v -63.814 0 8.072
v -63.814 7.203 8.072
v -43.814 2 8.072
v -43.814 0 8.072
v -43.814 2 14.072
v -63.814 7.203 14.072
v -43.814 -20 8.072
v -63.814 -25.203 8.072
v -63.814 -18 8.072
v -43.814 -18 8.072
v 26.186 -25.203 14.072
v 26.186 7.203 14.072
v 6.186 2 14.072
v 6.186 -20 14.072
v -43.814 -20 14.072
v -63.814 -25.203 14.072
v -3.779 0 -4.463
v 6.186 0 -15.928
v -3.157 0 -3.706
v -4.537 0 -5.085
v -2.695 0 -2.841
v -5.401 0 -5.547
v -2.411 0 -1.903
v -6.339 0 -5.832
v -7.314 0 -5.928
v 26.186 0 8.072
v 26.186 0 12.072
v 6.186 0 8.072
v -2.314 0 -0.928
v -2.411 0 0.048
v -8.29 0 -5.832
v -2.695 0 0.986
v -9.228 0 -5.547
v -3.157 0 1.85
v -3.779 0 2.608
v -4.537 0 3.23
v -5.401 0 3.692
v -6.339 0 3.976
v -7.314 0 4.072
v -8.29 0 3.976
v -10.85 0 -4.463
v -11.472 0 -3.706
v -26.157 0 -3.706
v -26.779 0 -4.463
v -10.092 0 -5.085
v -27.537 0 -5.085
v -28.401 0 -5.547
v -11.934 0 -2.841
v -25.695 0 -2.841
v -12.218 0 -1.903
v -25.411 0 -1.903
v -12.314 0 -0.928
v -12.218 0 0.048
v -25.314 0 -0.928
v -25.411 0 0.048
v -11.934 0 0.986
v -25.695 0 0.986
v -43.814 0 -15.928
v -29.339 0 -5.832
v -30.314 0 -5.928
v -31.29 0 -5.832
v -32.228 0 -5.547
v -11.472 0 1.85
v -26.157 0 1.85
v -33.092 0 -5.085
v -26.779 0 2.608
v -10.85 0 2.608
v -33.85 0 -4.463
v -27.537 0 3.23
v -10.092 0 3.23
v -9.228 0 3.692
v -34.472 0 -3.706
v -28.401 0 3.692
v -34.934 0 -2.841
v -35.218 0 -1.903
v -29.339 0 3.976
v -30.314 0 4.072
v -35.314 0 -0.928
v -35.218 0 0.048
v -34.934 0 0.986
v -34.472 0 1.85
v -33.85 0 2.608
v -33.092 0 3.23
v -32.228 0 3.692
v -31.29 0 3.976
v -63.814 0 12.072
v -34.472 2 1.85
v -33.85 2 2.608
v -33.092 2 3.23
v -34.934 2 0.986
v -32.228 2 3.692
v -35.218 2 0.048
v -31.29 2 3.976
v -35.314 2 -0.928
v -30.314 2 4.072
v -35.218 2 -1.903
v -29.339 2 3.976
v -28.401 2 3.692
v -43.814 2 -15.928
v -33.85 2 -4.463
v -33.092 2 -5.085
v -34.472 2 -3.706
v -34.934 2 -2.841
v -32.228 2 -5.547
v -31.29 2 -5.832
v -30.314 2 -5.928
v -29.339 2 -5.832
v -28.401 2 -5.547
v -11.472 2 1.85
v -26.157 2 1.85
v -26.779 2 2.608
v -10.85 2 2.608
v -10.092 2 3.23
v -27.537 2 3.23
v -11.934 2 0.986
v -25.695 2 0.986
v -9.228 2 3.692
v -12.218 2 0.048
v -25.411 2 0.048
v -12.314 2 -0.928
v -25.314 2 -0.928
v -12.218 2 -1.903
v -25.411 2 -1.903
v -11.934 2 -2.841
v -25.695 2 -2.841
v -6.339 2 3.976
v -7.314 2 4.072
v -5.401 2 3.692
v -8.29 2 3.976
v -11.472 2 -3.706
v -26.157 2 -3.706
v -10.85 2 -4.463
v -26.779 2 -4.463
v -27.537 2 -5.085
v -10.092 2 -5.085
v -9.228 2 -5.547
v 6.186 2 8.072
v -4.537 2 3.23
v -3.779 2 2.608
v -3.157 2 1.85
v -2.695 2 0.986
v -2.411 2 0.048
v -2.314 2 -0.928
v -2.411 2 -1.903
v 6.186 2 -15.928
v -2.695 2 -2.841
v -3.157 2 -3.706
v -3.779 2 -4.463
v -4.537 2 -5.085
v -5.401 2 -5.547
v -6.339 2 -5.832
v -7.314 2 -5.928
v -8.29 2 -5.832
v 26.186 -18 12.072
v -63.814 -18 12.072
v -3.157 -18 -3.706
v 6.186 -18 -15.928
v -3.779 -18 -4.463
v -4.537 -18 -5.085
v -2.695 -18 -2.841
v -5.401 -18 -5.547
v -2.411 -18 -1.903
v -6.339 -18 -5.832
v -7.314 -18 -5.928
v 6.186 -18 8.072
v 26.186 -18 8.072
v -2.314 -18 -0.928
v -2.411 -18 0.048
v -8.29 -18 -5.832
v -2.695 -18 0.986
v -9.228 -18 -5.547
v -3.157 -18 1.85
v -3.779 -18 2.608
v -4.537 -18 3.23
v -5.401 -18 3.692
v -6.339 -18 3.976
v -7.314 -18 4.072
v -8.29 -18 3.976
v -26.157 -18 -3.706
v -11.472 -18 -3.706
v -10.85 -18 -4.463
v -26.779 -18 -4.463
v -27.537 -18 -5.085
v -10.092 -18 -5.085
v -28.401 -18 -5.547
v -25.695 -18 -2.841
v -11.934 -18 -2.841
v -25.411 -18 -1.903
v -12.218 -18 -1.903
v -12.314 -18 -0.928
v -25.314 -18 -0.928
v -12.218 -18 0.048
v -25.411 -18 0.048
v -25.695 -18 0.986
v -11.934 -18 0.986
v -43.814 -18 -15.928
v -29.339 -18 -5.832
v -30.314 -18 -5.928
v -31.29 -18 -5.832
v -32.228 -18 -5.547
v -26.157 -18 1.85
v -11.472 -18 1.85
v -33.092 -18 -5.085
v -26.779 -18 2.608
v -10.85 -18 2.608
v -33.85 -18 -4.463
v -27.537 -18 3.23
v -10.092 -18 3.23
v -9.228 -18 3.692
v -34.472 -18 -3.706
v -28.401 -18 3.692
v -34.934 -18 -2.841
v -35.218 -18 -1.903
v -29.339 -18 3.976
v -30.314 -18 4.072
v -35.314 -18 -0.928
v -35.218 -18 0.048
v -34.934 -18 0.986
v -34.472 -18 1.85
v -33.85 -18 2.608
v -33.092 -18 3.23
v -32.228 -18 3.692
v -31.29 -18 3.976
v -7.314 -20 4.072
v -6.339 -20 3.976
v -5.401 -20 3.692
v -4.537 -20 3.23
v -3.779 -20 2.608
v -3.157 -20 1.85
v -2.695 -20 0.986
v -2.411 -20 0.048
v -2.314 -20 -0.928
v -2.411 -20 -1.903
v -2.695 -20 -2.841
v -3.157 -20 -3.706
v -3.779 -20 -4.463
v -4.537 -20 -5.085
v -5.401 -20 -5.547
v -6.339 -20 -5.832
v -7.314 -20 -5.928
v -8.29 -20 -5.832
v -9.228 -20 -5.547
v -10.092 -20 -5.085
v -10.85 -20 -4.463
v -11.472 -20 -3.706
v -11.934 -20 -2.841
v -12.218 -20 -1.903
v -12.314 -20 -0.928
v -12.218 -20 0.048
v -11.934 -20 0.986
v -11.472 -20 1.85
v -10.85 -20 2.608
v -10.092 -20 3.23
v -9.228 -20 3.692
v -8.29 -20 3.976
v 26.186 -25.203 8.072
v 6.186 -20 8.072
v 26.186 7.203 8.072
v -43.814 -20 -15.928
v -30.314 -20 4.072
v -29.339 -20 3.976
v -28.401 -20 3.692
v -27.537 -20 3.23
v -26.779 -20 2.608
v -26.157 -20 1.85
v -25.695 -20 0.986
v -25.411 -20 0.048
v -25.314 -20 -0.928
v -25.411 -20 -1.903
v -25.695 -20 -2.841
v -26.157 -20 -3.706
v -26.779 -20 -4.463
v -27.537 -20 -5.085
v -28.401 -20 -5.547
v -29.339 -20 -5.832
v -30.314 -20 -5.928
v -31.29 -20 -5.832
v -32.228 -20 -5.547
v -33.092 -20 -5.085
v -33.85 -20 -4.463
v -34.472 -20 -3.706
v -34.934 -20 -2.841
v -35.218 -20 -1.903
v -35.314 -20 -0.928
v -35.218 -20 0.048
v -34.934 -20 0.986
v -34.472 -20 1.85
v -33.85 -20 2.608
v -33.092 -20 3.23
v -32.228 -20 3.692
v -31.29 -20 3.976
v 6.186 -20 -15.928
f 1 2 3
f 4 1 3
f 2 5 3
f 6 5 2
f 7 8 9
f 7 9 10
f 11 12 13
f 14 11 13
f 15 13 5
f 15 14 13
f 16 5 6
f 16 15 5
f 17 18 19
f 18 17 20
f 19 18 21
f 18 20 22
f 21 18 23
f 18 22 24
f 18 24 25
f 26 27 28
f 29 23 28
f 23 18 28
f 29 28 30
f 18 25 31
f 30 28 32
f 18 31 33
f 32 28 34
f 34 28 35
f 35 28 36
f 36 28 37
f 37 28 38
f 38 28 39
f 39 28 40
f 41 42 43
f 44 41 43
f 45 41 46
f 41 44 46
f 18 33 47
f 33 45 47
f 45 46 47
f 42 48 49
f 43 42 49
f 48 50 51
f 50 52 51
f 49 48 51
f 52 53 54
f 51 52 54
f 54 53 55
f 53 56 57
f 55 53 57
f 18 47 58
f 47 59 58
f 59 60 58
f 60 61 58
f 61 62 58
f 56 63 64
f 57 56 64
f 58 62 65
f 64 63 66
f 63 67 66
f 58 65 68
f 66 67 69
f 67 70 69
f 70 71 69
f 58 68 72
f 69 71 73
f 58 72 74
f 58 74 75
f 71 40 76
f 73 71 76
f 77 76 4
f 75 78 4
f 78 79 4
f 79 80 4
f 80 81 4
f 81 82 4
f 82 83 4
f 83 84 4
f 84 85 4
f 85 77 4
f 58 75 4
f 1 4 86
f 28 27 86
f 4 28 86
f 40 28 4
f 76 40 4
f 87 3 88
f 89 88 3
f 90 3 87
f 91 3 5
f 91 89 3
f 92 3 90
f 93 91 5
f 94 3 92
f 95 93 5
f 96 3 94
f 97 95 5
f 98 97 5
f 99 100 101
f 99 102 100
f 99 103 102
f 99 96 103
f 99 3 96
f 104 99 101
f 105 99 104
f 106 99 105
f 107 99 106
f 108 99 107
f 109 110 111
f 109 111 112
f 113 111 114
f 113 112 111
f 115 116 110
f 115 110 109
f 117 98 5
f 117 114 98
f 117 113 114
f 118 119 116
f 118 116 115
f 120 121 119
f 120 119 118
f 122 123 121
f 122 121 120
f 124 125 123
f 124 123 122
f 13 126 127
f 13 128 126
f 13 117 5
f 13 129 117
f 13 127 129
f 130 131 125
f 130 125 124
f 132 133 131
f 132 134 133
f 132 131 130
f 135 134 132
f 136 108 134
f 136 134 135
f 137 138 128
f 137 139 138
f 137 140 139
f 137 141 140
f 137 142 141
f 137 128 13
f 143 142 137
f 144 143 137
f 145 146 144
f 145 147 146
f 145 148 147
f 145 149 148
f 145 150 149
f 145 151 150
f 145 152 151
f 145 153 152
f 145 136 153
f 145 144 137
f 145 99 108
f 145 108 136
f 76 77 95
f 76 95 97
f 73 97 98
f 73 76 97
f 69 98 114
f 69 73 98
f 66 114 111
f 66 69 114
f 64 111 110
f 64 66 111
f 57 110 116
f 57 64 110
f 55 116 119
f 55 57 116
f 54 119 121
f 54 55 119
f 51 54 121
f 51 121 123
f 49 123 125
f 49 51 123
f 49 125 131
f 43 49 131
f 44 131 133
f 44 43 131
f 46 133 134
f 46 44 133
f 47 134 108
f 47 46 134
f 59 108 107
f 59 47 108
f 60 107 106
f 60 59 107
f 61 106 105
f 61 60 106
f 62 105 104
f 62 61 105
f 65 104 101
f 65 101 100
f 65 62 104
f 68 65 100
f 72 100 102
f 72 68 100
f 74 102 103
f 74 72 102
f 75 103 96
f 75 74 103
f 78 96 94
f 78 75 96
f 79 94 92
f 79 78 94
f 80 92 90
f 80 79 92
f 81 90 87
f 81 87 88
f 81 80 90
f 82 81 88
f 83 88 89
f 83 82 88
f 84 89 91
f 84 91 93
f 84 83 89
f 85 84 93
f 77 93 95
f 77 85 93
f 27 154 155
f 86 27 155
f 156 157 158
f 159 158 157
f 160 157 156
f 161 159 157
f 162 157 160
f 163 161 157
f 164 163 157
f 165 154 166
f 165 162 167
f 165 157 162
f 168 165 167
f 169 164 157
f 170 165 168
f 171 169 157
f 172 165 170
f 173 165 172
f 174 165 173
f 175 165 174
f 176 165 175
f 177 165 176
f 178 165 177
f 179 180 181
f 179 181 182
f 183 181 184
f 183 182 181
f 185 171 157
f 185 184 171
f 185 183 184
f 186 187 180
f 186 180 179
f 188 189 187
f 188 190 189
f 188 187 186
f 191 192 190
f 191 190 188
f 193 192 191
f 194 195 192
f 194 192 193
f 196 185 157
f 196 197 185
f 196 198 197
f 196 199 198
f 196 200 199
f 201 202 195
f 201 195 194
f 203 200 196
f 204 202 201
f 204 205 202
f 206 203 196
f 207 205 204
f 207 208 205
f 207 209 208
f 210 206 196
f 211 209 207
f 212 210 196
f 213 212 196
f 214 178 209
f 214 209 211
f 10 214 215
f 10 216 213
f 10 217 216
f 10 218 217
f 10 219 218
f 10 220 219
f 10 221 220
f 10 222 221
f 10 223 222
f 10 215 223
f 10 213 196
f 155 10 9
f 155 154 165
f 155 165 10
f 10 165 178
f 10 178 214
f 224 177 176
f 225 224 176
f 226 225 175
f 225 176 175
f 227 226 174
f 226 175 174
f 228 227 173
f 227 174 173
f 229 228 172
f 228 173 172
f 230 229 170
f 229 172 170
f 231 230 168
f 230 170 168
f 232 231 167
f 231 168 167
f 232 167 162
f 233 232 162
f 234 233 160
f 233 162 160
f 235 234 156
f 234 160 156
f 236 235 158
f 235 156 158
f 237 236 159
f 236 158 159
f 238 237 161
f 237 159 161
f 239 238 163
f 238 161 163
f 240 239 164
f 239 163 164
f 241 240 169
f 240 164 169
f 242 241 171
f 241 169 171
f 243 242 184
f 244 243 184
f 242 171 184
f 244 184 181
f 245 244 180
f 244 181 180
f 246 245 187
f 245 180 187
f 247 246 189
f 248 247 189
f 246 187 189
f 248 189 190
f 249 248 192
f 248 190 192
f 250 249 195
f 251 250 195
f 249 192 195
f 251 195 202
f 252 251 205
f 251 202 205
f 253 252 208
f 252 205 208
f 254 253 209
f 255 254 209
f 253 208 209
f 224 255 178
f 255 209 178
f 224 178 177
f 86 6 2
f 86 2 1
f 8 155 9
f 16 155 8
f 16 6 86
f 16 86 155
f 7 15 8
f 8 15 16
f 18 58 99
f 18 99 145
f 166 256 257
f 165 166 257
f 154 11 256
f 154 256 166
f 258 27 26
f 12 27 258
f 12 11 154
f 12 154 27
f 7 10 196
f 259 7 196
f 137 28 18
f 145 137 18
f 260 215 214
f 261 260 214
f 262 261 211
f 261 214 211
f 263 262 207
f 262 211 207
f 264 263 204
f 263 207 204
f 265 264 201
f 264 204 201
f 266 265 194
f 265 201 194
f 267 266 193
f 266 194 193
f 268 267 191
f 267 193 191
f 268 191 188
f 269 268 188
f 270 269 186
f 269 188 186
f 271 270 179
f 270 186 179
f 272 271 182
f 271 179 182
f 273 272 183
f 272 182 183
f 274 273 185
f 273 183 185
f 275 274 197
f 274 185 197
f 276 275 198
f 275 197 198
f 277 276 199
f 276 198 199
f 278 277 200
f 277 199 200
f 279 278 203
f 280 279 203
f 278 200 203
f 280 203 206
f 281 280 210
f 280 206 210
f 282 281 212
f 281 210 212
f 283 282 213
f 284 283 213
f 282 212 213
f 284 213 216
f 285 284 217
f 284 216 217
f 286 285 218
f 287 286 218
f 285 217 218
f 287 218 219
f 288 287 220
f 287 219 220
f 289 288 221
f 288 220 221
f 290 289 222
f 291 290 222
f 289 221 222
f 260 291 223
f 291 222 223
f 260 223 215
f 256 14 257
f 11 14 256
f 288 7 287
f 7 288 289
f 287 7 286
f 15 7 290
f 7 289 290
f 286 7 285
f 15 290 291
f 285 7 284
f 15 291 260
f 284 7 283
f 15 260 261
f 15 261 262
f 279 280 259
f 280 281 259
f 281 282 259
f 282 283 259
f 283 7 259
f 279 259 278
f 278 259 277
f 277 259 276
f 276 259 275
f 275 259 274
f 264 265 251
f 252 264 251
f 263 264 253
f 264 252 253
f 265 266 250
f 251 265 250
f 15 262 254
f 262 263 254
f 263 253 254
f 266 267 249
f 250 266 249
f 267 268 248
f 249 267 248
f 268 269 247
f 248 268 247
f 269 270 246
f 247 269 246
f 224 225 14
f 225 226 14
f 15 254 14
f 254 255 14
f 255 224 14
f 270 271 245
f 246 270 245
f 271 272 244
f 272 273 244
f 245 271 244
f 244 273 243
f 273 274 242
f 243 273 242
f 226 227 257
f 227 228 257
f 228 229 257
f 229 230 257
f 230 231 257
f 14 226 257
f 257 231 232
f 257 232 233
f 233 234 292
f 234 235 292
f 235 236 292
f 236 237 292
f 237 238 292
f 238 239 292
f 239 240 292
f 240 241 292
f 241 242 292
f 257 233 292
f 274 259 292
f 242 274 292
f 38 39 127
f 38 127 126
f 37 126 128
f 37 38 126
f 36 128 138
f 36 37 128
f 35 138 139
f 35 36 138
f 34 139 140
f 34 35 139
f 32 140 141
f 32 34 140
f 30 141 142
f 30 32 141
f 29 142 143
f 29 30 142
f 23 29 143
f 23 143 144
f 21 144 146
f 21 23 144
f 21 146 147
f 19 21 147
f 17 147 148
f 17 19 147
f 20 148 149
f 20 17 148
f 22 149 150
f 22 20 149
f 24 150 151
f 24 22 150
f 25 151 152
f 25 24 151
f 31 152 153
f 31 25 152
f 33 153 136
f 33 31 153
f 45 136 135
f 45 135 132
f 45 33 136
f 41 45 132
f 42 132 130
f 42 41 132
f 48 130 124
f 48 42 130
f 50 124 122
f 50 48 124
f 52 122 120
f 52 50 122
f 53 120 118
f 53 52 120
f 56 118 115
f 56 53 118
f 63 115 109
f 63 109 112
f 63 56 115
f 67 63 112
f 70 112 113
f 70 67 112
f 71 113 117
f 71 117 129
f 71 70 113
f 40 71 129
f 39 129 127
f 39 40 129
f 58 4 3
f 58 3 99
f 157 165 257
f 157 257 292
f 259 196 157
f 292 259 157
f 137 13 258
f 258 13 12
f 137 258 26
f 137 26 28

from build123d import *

# Parameters (mm, degrees)
SKETCH1_W           = 50
SKETCH1_H           = 30
SKETCH1_R           = 5
BOSS_EXTRUDE2_DEPTH = 2
BOSS_EXTRUDE3_DEPTH = 2
BOSS_EXTRUDE4_DEPTH = 6


with BuildPart() as part:
    # Sketch1 → Boss-Extrude2 (new body)
    with BuildSketch(Plane(origin=(0, 0, 0), x_dir=(1, 0, 0), z_dir=(0, 1, 0))):
        with Locations((-18.81443299, 0.927835052)):
            Rectangle(SKETCH1_W, SKETCH1_H)
        with Locations((-7.31443299, 0.927835052)):
            Circle(SKETCH1_R, mode=Mode.SUBTRACT)
        with Locations((-30.31443299, 0.927835052)):
            Circle(SKETCH1_R, mode=Mode.SUBTRACT)
    extrude(amount=BOSS_EXTRUDE2_DEPTH)

    # Sketch2 → Boss-Extrude3 (add)
    with BuildSketch(Plane.XY.offset(14.072164948)):
        Polygon((6.18556701, 0), (-43.81443299, 0), (-63.81443299, 0), (-63.81443299, -9), (26.18556701, -9), (26.18556701, 0), align=None)
    extrude(amount=-BOSS_EXTRUDE3_DEPTH)

    # Sketch2<4> → Boss-Extrude4 (add)
    with BuildSketch(Plane.XY.offset(14.072164948)):
        Polygon((-63.81443299, 0), (-43.81443299, 0), (-43.81443299, 2), (-63.81443299, 7.203034525), align=None)
        Polygon((6.18556701, 2), (6.18556701, 0), (26.18556701, 0), (26.18556701, 7.203034525), align=None)
    extrude(amount=-BOSS_EXTRUDE4_DEPTH)

    # Mirror1: part across plane


with BuildPart() as part_1:
    add(part.part)
    add(part.part.mirror(Plane(origin=(0, -9, 12.072164948), x_dir=(0, 0, 1), z_dir=(0, -1, 0))))


solid = part_1.part
